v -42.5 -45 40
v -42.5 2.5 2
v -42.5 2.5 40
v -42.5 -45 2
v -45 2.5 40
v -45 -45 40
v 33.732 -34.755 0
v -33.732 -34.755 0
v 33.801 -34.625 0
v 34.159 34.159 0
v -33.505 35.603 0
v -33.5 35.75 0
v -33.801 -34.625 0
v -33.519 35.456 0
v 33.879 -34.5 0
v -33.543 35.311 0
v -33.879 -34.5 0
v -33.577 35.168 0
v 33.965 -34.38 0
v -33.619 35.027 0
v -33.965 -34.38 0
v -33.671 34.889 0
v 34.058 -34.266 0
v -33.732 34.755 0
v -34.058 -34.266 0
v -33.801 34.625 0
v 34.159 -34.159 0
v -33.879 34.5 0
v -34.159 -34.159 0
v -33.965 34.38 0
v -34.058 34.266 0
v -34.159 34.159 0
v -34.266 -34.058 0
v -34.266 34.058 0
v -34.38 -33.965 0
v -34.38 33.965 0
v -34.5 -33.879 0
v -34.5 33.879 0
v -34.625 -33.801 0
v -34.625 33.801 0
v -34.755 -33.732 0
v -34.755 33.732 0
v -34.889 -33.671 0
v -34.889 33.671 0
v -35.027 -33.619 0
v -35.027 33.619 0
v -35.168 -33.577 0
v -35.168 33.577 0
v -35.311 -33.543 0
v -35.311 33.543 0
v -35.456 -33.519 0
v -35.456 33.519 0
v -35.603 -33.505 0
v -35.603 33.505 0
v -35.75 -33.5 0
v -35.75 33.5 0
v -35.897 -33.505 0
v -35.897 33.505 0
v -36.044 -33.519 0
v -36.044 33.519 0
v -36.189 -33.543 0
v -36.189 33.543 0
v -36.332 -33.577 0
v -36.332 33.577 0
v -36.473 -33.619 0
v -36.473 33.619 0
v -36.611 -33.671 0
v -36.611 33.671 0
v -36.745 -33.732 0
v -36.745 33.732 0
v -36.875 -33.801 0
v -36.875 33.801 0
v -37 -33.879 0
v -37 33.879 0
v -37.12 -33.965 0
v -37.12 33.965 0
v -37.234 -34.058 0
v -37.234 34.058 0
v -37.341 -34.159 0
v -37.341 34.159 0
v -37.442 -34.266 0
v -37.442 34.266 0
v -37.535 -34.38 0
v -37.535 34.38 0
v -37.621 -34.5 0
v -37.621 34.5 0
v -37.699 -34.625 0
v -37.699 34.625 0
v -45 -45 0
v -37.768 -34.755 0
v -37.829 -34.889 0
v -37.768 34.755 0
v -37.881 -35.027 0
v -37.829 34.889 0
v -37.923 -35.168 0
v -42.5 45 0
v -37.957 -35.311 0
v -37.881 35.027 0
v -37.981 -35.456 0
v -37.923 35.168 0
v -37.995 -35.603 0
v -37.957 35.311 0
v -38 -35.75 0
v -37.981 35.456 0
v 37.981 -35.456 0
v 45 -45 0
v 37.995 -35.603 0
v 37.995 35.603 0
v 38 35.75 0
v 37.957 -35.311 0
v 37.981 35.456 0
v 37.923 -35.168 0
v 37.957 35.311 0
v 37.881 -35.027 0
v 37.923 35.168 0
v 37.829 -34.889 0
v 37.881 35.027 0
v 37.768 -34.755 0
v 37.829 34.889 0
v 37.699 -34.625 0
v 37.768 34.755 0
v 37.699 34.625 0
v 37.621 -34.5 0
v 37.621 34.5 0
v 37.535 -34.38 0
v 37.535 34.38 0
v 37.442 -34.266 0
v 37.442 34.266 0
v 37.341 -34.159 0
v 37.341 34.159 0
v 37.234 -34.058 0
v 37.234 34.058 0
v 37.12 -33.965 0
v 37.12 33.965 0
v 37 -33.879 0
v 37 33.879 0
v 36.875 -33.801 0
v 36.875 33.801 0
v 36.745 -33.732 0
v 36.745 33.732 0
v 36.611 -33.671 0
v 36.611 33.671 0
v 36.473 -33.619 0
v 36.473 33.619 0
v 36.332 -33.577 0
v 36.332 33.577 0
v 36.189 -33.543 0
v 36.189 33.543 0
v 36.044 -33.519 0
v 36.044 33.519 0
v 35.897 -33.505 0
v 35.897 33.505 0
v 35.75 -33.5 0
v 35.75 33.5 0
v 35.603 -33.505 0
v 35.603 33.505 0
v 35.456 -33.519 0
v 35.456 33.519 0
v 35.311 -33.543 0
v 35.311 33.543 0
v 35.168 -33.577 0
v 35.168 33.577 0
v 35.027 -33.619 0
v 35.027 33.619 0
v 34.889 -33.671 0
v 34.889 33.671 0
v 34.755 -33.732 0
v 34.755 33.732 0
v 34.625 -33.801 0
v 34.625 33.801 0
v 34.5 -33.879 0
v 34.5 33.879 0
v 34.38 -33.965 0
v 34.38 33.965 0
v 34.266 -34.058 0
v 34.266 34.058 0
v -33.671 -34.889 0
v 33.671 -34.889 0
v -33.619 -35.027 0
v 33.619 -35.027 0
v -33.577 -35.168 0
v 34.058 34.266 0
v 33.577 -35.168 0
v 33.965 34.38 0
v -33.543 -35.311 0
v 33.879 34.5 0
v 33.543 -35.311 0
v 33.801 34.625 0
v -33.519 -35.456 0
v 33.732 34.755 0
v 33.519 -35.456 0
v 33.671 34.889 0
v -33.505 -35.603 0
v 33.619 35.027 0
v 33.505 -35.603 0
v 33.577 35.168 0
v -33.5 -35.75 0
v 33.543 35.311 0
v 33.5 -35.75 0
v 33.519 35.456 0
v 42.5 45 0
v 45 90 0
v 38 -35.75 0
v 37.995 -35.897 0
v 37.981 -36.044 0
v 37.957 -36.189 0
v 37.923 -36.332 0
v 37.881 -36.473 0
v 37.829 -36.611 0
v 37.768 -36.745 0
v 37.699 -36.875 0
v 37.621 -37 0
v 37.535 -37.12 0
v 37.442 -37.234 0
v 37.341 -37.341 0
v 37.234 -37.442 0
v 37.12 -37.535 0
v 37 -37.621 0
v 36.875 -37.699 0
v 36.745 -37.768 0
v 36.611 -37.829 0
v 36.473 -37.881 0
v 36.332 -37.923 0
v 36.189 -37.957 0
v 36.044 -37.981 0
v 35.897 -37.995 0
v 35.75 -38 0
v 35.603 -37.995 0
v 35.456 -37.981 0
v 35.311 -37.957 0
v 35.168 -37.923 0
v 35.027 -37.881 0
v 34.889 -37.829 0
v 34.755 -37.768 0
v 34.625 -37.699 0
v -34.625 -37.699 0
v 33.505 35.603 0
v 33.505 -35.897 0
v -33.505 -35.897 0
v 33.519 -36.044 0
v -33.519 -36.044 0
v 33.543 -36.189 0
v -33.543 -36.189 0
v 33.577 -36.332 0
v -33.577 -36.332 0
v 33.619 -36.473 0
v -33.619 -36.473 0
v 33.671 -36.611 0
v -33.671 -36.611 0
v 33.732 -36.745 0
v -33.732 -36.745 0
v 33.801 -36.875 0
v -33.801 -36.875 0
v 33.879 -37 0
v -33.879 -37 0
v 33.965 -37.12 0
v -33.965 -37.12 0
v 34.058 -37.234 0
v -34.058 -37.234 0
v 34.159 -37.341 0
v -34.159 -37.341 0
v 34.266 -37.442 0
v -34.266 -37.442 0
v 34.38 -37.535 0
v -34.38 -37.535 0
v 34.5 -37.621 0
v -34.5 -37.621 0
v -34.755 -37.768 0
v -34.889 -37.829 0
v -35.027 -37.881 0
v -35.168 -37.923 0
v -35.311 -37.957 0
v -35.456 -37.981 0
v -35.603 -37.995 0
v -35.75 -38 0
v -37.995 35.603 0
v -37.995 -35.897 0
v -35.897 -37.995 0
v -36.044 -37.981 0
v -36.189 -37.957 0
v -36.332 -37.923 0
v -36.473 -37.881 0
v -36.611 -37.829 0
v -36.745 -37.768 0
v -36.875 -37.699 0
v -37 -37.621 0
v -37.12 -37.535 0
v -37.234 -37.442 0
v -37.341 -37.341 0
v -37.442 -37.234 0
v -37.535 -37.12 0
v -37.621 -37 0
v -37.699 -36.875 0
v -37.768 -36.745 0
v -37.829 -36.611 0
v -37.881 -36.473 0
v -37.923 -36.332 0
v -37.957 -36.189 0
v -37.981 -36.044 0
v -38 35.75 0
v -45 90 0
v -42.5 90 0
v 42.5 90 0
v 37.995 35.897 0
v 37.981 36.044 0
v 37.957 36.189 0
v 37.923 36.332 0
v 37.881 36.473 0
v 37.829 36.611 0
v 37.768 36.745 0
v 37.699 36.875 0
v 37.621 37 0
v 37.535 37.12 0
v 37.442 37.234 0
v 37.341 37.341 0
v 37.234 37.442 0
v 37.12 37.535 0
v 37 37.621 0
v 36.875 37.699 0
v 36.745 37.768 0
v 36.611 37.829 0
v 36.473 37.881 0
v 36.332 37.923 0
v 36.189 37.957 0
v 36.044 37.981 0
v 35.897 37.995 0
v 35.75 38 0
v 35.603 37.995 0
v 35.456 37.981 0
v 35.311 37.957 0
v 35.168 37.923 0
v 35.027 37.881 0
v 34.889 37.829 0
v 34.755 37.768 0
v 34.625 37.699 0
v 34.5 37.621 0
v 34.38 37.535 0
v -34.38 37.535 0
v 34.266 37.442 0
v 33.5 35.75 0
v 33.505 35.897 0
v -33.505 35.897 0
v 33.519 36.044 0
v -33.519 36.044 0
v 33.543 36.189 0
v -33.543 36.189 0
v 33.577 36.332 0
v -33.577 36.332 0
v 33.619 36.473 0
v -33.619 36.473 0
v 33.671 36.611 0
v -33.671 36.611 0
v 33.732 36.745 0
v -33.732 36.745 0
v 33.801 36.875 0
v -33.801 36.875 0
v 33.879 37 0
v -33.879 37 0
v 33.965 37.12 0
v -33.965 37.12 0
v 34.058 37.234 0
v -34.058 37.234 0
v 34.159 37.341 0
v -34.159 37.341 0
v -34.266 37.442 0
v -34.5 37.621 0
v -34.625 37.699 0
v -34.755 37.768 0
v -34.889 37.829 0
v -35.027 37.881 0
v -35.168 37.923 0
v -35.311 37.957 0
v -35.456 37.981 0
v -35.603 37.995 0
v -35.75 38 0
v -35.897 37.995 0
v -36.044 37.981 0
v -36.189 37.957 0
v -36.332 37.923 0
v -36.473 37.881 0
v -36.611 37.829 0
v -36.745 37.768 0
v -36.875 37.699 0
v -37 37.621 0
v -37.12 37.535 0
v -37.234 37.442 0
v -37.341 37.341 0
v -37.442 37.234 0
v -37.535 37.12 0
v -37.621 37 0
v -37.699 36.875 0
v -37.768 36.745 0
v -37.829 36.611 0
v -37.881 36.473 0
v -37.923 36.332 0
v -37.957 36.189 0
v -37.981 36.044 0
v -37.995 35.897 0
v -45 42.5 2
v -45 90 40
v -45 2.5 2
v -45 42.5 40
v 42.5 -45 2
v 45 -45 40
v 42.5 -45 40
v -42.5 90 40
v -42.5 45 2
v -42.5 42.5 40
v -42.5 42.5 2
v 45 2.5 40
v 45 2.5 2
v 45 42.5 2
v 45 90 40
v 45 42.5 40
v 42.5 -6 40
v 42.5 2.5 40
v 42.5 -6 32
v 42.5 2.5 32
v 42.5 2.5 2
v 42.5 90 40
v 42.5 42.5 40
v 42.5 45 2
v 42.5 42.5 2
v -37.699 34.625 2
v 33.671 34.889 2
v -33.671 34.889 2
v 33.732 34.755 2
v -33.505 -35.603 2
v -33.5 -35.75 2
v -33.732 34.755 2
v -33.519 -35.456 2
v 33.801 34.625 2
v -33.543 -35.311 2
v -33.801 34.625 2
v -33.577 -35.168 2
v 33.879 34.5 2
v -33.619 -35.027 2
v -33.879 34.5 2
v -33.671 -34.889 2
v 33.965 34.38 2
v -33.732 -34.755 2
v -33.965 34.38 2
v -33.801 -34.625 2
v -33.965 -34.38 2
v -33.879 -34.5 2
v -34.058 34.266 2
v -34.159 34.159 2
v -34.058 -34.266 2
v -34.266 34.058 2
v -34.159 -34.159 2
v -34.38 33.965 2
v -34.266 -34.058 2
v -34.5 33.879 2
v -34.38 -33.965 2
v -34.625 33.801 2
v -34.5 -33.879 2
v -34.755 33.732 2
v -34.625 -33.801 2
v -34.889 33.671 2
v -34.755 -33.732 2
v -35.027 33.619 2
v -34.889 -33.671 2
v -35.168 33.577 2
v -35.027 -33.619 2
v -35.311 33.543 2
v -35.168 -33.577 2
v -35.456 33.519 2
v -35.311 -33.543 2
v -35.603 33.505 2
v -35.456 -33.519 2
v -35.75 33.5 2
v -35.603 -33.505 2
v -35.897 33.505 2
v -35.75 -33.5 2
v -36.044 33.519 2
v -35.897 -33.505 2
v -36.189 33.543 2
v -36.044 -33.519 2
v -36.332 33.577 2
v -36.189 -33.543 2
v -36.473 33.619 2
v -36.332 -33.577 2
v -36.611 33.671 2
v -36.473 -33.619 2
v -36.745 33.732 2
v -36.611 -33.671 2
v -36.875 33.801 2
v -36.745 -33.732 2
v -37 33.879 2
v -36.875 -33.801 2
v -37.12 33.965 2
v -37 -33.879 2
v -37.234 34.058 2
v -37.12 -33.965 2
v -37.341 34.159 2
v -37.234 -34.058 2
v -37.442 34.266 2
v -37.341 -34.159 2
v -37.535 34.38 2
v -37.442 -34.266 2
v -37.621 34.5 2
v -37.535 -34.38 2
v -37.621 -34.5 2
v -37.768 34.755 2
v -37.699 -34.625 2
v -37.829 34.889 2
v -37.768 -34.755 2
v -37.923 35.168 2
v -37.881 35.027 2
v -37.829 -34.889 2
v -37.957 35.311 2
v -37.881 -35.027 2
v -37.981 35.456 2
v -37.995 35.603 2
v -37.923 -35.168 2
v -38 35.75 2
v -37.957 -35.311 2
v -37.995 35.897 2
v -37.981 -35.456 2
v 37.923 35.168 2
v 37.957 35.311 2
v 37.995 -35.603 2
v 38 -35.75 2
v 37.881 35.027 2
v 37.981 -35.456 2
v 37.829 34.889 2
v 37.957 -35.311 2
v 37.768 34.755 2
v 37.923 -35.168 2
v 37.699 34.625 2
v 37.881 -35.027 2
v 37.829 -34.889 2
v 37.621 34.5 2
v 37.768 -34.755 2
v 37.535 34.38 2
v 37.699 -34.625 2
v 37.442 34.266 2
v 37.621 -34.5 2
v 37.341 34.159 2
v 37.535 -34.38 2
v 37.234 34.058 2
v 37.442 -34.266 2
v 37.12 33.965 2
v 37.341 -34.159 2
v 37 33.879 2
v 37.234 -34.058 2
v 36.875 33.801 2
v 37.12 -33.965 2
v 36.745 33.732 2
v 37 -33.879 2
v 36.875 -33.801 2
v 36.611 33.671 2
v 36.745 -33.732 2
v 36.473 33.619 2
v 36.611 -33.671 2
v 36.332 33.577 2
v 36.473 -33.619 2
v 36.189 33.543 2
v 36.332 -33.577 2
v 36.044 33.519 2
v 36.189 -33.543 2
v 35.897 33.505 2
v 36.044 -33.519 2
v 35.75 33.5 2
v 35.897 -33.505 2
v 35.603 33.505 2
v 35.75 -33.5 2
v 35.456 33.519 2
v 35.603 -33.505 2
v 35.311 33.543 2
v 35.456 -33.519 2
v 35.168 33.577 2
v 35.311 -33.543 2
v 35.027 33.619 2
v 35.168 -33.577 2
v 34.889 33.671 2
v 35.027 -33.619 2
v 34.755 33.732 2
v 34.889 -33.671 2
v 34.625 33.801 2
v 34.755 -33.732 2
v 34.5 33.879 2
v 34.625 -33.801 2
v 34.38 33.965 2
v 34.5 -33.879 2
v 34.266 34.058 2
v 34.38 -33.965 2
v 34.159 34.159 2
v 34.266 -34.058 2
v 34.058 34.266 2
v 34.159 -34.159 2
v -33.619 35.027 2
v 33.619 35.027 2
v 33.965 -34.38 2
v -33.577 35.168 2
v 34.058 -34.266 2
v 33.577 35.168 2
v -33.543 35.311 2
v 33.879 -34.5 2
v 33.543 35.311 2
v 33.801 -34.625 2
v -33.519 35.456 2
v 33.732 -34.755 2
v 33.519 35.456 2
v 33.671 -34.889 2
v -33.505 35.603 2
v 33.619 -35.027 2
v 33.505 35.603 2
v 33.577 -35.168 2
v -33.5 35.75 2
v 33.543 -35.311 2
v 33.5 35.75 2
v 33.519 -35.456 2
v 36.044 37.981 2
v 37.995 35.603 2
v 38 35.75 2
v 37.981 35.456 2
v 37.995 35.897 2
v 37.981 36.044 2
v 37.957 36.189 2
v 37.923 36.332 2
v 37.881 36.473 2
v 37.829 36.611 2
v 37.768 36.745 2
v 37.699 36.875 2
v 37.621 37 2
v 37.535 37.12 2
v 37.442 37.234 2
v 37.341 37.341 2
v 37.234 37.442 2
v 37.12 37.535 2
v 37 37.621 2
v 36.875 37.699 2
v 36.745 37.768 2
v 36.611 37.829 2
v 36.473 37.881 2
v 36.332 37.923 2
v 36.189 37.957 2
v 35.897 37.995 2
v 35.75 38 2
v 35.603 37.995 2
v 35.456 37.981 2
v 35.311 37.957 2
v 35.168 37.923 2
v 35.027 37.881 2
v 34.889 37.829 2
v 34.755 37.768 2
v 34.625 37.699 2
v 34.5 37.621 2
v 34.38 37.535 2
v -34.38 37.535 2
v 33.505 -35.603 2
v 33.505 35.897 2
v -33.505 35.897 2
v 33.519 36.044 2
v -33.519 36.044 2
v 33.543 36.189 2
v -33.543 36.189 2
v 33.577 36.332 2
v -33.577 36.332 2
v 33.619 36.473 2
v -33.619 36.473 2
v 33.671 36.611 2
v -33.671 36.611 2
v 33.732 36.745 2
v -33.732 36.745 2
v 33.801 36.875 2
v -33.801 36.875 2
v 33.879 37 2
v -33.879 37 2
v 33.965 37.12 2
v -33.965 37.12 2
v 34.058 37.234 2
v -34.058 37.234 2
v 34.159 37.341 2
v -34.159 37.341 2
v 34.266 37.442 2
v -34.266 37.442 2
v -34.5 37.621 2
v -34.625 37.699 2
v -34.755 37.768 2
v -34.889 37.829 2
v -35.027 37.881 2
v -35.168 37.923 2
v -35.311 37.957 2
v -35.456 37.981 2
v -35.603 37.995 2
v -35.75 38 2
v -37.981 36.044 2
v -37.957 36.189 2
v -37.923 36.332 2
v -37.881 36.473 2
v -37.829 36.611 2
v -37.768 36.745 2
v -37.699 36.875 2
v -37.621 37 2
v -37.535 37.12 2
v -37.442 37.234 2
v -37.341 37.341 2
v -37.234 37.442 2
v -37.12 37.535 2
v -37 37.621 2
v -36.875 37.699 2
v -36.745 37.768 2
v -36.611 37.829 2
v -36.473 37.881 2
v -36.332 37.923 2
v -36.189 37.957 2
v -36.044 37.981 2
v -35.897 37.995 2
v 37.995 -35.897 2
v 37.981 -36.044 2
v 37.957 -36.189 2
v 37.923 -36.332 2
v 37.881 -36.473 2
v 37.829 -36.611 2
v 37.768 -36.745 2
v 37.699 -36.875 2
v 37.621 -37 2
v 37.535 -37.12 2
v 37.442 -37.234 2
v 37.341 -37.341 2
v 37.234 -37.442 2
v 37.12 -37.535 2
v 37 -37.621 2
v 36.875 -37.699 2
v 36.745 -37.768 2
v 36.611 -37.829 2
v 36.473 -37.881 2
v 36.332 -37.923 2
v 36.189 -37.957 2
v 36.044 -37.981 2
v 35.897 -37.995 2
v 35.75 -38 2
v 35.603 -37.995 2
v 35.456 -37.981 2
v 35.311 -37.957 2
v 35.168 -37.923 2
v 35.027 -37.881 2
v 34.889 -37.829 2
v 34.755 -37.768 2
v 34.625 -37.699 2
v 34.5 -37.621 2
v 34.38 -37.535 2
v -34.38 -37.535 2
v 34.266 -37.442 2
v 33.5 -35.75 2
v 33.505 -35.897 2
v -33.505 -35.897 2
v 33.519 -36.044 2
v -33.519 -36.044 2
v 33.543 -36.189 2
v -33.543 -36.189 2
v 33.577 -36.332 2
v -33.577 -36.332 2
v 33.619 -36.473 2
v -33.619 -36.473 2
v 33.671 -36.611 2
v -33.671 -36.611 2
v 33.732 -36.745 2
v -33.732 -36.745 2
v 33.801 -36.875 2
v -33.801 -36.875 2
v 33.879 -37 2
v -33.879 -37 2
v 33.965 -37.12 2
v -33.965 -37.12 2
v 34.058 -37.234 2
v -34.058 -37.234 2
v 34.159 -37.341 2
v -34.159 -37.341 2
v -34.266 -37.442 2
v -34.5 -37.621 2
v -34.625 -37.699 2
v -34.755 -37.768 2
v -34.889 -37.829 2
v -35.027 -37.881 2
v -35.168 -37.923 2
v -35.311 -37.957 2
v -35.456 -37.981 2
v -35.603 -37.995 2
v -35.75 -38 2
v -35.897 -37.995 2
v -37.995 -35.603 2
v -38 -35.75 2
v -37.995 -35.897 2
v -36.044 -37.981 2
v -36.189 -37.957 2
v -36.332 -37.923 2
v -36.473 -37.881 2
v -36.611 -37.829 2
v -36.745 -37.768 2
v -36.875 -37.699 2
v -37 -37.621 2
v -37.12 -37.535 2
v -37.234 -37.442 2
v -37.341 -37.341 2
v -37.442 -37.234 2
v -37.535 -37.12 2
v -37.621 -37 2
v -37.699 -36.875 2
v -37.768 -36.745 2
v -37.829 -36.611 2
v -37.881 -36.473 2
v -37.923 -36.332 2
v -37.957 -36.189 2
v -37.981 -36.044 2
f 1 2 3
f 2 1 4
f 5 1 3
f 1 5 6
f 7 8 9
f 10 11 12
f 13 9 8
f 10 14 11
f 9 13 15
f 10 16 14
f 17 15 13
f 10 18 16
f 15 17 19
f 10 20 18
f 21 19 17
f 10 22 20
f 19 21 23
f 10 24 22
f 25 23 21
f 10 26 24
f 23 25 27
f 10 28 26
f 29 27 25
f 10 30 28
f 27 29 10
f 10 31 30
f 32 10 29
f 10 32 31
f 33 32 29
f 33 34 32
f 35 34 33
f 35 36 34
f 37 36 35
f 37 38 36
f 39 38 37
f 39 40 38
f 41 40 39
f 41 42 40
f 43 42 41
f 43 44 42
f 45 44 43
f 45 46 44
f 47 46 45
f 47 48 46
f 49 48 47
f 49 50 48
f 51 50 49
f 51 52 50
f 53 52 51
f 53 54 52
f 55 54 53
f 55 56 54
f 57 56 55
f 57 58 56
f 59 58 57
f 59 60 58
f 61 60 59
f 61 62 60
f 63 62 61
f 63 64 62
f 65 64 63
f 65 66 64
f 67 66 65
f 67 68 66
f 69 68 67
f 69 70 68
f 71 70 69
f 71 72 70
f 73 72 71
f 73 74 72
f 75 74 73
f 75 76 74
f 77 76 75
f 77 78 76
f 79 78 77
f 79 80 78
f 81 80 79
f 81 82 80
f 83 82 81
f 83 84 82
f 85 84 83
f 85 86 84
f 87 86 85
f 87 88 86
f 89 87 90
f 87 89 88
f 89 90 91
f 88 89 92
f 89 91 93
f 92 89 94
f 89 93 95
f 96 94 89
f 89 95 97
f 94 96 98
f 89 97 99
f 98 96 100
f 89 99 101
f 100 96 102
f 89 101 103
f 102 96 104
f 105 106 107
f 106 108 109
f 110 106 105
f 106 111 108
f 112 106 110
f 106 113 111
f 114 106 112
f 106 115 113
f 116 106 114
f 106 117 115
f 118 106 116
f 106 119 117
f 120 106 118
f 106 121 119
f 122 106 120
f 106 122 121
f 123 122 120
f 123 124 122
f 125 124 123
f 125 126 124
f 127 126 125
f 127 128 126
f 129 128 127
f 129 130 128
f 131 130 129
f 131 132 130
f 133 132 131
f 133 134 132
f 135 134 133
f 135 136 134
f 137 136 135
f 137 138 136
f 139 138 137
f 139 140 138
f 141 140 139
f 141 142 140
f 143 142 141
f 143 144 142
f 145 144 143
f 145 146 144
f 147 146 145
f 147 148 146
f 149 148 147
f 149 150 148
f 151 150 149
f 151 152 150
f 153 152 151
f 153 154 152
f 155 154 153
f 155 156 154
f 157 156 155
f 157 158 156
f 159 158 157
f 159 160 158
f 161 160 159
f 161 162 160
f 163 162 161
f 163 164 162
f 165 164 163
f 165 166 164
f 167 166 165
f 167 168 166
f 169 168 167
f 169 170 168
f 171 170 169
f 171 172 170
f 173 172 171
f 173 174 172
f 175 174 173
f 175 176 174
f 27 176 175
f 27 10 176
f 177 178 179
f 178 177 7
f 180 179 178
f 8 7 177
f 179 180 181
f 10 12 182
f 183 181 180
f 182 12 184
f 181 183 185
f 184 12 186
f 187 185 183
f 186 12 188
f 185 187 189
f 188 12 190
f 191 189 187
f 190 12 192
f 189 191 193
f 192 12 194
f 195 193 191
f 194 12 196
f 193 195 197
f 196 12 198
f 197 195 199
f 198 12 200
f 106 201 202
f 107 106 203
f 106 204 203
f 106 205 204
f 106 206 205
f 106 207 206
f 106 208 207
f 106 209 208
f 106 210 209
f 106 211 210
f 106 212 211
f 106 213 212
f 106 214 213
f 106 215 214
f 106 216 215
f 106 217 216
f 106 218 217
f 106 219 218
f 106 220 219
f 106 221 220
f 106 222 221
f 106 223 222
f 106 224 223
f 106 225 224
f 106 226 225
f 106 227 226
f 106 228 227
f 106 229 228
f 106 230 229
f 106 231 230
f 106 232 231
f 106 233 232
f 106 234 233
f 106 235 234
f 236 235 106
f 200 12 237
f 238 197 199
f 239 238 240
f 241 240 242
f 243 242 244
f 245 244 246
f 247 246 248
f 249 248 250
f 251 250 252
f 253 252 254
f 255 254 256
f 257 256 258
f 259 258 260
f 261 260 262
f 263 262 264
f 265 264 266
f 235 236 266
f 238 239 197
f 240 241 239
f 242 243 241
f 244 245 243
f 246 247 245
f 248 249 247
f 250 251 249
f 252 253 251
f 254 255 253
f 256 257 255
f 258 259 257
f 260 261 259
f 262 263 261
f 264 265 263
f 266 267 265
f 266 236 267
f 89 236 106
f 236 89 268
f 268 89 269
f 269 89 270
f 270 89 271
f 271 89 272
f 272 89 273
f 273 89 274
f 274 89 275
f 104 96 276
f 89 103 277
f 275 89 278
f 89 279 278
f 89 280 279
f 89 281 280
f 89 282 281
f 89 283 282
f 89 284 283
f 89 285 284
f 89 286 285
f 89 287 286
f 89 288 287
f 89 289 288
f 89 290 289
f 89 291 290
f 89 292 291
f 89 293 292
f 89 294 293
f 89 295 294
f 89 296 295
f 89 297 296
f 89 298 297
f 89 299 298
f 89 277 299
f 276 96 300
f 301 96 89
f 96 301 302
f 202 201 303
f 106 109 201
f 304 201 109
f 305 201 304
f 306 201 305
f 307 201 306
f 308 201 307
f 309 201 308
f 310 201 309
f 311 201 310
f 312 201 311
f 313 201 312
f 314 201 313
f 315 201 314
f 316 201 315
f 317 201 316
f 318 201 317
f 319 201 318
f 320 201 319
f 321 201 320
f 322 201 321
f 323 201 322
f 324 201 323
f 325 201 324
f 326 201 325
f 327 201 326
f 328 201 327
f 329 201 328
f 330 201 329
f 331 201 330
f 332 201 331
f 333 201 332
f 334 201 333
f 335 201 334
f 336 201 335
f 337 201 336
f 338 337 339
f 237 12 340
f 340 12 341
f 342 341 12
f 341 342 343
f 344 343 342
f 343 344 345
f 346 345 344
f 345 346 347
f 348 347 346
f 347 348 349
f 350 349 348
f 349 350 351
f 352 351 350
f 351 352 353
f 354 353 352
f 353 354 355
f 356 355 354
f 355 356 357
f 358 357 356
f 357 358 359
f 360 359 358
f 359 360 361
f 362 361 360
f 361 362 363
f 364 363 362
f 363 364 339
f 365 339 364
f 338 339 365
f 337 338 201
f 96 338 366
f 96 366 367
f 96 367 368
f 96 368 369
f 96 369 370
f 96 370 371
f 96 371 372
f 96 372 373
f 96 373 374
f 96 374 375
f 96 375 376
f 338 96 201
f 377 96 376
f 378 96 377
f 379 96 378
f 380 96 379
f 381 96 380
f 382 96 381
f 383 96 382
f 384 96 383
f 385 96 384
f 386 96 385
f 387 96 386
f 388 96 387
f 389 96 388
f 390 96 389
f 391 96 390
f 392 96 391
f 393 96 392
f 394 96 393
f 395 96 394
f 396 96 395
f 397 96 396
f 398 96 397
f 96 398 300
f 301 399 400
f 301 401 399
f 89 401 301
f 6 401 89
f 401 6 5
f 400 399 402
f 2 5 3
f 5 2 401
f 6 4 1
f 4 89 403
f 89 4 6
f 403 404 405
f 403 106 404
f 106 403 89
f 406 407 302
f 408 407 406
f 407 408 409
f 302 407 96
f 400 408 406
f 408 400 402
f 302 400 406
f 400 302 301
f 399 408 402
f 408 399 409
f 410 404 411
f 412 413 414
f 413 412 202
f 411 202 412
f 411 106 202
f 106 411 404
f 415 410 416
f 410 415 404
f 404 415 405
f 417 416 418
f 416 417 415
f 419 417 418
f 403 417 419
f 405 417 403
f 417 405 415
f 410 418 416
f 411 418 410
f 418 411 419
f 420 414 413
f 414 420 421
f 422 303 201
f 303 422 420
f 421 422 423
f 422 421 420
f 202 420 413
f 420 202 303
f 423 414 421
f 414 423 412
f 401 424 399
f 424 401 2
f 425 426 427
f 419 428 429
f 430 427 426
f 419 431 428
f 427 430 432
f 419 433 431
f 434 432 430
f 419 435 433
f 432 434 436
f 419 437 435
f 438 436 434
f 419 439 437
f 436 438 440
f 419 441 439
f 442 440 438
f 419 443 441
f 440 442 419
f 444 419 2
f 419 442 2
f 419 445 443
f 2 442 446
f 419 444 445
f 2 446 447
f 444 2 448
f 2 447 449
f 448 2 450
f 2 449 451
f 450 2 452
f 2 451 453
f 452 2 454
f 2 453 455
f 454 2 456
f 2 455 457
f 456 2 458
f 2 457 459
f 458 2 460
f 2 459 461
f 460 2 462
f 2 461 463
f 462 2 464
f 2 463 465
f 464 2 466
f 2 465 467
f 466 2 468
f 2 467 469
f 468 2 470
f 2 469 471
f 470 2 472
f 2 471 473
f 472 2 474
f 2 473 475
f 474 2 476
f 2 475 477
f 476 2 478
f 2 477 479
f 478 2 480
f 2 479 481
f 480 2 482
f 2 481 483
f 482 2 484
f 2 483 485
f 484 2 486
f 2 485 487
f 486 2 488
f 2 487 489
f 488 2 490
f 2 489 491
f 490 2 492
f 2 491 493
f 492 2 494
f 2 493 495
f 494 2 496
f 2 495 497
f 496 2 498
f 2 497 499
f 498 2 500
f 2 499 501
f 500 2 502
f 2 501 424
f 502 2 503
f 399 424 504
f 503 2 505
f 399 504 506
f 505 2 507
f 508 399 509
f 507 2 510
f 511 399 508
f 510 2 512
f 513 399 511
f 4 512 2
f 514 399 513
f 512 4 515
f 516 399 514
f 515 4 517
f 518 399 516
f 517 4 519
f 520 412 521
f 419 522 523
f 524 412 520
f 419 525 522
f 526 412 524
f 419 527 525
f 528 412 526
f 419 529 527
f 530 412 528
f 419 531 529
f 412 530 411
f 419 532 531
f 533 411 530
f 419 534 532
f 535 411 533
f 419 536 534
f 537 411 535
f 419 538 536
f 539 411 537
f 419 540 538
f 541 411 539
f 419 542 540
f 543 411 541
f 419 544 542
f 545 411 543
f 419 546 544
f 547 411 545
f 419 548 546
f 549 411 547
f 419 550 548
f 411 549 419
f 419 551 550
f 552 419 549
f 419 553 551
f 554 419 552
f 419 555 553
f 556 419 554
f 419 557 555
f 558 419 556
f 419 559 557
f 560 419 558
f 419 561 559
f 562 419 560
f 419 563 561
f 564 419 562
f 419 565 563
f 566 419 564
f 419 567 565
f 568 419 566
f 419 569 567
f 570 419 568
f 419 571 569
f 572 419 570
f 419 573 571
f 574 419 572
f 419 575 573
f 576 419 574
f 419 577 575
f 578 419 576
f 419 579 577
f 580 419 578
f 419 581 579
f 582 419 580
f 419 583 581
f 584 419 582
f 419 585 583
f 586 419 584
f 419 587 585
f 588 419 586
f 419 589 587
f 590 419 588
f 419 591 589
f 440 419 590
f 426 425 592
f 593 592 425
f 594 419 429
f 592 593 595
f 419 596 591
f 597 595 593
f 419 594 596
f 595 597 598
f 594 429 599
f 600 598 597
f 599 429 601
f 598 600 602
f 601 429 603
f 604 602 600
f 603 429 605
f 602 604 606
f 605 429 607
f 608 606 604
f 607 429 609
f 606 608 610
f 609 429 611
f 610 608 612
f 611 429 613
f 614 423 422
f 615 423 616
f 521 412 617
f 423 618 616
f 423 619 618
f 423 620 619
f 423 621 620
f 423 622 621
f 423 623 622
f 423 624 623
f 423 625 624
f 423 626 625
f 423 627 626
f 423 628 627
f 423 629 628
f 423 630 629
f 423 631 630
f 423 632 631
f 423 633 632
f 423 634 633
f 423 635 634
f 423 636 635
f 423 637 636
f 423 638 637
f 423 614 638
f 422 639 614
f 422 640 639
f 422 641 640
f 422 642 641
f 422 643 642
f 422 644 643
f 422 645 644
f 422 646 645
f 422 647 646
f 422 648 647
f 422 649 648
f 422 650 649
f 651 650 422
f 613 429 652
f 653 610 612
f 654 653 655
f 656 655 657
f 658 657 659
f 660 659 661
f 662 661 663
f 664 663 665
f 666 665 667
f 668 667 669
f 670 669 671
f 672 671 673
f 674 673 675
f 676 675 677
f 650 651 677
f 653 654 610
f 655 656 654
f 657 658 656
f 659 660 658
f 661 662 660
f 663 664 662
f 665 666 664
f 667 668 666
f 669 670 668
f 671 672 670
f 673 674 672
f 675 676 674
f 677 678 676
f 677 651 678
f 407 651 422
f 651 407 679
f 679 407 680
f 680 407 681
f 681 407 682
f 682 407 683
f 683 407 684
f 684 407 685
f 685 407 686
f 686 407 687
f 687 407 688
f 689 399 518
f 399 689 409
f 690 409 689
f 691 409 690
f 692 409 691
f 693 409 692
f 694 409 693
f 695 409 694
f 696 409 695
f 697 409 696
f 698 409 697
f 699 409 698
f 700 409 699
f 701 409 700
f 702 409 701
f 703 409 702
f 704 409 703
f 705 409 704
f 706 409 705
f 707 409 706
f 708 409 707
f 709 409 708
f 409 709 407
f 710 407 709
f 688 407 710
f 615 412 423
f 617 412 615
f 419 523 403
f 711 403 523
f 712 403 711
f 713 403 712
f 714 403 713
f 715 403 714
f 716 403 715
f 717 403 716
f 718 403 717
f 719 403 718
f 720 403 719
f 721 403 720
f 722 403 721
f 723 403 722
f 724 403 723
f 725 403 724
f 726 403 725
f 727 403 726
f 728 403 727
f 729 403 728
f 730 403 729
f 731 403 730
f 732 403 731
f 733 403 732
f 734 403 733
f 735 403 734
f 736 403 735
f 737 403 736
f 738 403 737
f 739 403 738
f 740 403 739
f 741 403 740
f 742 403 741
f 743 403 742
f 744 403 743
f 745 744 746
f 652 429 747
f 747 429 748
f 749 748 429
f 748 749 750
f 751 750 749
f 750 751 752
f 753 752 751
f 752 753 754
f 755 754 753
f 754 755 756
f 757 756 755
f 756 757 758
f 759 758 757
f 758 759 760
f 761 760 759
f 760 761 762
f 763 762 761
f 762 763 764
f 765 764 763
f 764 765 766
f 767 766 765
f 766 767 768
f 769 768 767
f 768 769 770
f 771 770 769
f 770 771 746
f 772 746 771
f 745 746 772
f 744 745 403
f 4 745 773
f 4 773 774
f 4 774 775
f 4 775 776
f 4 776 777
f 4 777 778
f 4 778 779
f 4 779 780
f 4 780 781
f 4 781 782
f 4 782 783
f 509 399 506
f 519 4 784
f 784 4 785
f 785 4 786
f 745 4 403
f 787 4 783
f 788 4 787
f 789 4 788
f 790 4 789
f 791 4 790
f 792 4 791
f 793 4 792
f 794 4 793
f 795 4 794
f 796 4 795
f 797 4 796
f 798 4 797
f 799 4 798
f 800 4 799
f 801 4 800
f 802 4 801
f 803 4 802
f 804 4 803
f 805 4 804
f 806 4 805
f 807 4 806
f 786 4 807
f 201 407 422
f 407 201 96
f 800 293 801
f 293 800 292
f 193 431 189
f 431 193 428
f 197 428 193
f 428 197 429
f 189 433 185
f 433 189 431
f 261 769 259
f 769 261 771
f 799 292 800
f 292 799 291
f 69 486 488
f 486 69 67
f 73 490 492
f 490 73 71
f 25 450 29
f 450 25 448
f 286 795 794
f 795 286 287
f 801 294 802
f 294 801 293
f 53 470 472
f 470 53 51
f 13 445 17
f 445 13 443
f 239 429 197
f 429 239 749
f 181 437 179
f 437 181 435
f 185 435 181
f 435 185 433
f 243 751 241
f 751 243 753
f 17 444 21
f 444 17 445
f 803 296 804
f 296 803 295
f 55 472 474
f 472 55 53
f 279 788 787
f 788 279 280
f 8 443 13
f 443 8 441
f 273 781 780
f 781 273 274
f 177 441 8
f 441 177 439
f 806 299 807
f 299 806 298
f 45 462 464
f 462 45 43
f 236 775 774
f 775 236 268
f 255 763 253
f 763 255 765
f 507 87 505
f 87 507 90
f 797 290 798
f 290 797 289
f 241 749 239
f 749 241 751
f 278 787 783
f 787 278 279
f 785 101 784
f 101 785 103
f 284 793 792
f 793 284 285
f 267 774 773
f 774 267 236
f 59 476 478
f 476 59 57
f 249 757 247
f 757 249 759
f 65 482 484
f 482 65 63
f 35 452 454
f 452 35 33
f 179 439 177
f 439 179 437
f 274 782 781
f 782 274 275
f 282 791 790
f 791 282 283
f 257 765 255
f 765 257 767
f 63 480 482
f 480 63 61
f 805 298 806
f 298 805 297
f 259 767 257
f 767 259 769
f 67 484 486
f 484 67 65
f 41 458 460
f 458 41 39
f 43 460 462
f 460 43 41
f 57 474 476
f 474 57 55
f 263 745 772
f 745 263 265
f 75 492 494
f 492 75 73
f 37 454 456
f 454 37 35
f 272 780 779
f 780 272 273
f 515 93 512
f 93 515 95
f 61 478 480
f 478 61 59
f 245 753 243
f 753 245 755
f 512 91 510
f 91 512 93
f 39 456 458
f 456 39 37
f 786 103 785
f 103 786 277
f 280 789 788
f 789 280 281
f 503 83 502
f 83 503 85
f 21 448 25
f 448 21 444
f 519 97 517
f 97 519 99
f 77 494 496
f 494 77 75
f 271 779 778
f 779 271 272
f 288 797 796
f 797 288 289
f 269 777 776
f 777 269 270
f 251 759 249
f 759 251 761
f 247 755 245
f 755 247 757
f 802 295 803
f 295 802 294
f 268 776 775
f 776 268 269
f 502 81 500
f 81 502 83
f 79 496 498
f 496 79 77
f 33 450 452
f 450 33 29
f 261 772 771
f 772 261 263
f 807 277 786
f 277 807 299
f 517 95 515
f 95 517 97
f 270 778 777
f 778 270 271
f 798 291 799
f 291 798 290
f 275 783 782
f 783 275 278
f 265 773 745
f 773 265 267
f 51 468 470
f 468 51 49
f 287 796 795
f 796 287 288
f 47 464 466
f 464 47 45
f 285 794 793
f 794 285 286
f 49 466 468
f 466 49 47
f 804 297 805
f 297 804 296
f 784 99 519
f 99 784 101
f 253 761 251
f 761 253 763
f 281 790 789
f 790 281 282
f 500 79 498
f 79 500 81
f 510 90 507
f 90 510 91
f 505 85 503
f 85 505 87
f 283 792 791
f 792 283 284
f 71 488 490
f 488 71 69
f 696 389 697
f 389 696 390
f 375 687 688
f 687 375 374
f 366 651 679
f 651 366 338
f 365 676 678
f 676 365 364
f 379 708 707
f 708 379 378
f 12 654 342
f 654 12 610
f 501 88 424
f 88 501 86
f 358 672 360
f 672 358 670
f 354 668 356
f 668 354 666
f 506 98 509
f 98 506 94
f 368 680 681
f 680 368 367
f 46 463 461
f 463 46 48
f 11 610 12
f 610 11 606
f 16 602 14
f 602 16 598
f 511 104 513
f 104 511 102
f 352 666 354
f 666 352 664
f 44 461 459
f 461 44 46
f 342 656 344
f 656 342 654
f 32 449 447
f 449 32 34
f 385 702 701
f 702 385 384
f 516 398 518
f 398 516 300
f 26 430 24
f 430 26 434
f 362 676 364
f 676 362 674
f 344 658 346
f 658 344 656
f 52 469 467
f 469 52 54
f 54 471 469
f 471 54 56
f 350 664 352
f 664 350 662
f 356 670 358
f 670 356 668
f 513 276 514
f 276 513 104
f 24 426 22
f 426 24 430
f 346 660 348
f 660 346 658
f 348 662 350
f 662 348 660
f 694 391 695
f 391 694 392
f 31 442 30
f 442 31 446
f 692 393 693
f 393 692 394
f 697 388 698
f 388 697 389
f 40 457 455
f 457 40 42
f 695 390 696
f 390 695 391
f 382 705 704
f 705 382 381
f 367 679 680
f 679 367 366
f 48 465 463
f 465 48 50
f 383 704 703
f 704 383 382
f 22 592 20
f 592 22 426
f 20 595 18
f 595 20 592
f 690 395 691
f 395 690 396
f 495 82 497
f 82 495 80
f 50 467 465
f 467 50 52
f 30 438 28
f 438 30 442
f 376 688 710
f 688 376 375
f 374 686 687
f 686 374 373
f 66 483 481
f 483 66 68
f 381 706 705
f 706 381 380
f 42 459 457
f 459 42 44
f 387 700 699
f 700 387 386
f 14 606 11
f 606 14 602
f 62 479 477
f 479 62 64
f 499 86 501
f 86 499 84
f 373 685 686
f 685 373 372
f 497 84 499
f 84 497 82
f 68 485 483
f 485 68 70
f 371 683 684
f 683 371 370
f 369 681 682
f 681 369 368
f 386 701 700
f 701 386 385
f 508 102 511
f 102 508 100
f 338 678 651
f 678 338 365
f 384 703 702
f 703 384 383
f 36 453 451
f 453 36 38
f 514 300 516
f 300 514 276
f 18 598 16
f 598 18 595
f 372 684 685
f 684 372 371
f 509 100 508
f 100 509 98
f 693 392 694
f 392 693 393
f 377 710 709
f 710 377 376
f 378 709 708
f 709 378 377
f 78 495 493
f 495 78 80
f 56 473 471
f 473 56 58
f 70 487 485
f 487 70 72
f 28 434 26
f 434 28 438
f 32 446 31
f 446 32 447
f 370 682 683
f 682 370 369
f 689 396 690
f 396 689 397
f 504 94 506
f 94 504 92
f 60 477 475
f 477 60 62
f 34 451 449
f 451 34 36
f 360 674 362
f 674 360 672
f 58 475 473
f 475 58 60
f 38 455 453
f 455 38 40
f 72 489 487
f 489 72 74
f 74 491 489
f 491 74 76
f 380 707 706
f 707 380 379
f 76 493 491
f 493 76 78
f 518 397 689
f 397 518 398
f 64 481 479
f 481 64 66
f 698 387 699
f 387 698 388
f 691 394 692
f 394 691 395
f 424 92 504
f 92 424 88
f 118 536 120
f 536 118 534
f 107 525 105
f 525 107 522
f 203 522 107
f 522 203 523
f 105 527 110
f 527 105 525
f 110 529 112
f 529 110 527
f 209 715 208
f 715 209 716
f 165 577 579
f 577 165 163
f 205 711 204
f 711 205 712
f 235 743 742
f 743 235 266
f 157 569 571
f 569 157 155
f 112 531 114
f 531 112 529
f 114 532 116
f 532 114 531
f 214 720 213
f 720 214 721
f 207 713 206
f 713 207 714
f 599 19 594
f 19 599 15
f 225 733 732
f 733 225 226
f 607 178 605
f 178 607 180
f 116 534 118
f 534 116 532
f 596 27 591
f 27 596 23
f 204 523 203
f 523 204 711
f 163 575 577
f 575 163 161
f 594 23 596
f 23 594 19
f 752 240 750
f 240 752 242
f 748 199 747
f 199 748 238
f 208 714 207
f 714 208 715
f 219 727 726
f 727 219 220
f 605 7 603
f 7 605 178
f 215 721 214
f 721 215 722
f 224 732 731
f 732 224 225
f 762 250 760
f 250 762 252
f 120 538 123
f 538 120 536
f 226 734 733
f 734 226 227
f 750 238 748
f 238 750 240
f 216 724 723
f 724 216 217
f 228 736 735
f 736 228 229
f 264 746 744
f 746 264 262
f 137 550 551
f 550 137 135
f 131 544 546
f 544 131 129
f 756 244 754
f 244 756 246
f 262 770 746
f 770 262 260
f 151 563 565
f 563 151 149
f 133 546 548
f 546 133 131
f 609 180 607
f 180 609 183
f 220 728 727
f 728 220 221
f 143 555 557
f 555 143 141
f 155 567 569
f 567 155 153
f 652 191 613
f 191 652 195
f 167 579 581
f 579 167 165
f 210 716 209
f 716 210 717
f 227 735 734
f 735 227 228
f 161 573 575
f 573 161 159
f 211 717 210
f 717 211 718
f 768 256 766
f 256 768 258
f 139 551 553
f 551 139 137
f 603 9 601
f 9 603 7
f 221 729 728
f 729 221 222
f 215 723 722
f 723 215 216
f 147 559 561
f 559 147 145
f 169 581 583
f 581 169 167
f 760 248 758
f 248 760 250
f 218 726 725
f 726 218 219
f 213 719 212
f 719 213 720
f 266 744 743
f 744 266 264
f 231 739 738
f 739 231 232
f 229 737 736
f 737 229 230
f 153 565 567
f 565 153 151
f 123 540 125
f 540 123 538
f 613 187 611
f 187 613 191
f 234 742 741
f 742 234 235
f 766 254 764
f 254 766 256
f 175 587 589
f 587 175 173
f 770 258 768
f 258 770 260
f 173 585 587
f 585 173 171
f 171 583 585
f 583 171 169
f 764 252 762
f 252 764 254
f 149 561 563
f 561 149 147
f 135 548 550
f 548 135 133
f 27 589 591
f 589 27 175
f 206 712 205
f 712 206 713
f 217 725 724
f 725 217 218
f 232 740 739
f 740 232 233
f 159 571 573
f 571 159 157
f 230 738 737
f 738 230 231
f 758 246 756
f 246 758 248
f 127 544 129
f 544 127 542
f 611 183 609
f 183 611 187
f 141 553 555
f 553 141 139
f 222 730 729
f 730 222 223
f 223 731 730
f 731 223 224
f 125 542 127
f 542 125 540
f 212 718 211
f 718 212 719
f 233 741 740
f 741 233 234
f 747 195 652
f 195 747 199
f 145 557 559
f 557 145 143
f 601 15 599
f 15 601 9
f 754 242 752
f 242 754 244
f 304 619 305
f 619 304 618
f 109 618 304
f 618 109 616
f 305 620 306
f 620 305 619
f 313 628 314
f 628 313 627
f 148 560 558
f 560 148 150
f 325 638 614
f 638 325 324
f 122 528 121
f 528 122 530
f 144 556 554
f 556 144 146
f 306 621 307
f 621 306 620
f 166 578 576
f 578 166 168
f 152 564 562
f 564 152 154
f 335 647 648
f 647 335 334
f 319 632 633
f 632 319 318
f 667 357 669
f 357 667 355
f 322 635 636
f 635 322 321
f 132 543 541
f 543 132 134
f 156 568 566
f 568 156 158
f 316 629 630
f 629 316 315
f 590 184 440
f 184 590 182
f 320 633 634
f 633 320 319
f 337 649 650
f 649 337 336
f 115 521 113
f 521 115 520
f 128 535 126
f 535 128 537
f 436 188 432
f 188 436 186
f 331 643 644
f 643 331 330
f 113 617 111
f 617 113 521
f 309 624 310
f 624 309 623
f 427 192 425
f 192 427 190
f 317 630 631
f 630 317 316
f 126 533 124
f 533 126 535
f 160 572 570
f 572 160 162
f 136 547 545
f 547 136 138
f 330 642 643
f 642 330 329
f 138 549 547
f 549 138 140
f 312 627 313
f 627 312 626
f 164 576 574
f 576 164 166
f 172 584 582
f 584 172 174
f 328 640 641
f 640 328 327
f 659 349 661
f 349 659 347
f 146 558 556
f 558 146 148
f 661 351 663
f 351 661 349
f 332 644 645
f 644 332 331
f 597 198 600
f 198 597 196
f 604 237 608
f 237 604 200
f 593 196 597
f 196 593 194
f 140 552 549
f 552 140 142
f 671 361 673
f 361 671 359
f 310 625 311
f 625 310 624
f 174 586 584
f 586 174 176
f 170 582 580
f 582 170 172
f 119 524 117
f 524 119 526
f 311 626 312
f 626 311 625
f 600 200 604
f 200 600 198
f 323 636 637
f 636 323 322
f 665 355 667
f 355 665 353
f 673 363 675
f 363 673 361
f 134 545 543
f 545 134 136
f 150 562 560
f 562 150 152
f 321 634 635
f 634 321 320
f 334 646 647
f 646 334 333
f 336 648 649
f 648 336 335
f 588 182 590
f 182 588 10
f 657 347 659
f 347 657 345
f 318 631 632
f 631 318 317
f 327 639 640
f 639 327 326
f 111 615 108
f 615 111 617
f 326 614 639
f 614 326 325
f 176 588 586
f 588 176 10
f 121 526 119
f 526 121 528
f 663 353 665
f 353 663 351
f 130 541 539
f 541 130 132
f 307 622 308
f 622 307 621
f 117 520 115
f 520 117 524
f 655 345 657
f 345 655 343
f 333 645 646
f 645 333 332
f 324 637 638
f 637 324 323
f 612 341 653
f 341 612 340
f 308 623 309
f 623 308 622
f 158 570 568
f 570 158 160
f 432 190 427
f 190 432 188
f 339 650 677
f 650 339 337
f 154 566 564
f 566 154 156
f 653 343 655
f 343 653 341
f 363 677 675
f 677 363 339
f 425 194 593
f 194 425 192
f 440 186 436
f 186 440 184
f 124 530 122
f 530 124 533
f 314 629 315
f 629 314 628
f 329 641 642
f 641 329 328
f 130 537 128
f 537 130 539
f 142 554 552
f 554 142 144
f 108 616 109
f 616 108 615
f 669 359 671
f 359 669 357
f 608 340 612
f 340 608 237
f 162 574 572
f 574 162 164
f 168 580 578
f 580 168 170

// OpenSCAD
// DIY magnetic stirrer housing - print orientation: upside down, open box
// Units: mm

// ---- Dimensions ----
fan_d        = 80;    // fan diameter
outer_x      = 90;    // outer size X
outer_y      = 90;    // outer size Y
top_t        = 2;     // top plate thickness (z = 0 to 2)
wall_t       = 2.5;   // wall thickness
wall_h       = 40;    // wall height (z = 0 to 40)
notch_w      = 12;    // cable notch width
notch_bottom = 8;     // notch depth from open edge (z = 32 to 40)
hole_d       = 4.5;   // M4 screw hole diameter
hole_p       = 71.5;  // screw hole pattern size (square)
eps          = 0.5;   // cutter overshoot

$fn = 96;

// ---- Model ----
difference() {
    union() {
        // Top plate
        translate([-outer_x/2, -outer_y/2, 0])
            cube([outer_x, outer_y, top_t]);
        // Walls (open top)
        for (sx = [-1, 1], sy = [-1, 1])
            translate([sx > 0 ? outer_x/2 - wall_t : -outer_x/2,
                       sy > 0 ? outer_y/2 - wall_t : -outer_y/2,
                       0])
                cube([wall_t, outer_y - outer_y/2 + wall_t, wall_h]);
    }
    // Screw holes
    for (x = [-hole_p/2, hole_p/2], y = [-hole_p/2, hole_p/2])
        translate([x, y, -eps])
            cylinder(d = hole_d, h = top_t + 2*eps);
    // Cable notch in one wall (z = 32 to 40)
    translate([outer_x/2 - wall_t - eps, -notch_w/2, wall_h - notch_bottom])
        cube([eps, notch_w, notch_bottom + eps]);
}
